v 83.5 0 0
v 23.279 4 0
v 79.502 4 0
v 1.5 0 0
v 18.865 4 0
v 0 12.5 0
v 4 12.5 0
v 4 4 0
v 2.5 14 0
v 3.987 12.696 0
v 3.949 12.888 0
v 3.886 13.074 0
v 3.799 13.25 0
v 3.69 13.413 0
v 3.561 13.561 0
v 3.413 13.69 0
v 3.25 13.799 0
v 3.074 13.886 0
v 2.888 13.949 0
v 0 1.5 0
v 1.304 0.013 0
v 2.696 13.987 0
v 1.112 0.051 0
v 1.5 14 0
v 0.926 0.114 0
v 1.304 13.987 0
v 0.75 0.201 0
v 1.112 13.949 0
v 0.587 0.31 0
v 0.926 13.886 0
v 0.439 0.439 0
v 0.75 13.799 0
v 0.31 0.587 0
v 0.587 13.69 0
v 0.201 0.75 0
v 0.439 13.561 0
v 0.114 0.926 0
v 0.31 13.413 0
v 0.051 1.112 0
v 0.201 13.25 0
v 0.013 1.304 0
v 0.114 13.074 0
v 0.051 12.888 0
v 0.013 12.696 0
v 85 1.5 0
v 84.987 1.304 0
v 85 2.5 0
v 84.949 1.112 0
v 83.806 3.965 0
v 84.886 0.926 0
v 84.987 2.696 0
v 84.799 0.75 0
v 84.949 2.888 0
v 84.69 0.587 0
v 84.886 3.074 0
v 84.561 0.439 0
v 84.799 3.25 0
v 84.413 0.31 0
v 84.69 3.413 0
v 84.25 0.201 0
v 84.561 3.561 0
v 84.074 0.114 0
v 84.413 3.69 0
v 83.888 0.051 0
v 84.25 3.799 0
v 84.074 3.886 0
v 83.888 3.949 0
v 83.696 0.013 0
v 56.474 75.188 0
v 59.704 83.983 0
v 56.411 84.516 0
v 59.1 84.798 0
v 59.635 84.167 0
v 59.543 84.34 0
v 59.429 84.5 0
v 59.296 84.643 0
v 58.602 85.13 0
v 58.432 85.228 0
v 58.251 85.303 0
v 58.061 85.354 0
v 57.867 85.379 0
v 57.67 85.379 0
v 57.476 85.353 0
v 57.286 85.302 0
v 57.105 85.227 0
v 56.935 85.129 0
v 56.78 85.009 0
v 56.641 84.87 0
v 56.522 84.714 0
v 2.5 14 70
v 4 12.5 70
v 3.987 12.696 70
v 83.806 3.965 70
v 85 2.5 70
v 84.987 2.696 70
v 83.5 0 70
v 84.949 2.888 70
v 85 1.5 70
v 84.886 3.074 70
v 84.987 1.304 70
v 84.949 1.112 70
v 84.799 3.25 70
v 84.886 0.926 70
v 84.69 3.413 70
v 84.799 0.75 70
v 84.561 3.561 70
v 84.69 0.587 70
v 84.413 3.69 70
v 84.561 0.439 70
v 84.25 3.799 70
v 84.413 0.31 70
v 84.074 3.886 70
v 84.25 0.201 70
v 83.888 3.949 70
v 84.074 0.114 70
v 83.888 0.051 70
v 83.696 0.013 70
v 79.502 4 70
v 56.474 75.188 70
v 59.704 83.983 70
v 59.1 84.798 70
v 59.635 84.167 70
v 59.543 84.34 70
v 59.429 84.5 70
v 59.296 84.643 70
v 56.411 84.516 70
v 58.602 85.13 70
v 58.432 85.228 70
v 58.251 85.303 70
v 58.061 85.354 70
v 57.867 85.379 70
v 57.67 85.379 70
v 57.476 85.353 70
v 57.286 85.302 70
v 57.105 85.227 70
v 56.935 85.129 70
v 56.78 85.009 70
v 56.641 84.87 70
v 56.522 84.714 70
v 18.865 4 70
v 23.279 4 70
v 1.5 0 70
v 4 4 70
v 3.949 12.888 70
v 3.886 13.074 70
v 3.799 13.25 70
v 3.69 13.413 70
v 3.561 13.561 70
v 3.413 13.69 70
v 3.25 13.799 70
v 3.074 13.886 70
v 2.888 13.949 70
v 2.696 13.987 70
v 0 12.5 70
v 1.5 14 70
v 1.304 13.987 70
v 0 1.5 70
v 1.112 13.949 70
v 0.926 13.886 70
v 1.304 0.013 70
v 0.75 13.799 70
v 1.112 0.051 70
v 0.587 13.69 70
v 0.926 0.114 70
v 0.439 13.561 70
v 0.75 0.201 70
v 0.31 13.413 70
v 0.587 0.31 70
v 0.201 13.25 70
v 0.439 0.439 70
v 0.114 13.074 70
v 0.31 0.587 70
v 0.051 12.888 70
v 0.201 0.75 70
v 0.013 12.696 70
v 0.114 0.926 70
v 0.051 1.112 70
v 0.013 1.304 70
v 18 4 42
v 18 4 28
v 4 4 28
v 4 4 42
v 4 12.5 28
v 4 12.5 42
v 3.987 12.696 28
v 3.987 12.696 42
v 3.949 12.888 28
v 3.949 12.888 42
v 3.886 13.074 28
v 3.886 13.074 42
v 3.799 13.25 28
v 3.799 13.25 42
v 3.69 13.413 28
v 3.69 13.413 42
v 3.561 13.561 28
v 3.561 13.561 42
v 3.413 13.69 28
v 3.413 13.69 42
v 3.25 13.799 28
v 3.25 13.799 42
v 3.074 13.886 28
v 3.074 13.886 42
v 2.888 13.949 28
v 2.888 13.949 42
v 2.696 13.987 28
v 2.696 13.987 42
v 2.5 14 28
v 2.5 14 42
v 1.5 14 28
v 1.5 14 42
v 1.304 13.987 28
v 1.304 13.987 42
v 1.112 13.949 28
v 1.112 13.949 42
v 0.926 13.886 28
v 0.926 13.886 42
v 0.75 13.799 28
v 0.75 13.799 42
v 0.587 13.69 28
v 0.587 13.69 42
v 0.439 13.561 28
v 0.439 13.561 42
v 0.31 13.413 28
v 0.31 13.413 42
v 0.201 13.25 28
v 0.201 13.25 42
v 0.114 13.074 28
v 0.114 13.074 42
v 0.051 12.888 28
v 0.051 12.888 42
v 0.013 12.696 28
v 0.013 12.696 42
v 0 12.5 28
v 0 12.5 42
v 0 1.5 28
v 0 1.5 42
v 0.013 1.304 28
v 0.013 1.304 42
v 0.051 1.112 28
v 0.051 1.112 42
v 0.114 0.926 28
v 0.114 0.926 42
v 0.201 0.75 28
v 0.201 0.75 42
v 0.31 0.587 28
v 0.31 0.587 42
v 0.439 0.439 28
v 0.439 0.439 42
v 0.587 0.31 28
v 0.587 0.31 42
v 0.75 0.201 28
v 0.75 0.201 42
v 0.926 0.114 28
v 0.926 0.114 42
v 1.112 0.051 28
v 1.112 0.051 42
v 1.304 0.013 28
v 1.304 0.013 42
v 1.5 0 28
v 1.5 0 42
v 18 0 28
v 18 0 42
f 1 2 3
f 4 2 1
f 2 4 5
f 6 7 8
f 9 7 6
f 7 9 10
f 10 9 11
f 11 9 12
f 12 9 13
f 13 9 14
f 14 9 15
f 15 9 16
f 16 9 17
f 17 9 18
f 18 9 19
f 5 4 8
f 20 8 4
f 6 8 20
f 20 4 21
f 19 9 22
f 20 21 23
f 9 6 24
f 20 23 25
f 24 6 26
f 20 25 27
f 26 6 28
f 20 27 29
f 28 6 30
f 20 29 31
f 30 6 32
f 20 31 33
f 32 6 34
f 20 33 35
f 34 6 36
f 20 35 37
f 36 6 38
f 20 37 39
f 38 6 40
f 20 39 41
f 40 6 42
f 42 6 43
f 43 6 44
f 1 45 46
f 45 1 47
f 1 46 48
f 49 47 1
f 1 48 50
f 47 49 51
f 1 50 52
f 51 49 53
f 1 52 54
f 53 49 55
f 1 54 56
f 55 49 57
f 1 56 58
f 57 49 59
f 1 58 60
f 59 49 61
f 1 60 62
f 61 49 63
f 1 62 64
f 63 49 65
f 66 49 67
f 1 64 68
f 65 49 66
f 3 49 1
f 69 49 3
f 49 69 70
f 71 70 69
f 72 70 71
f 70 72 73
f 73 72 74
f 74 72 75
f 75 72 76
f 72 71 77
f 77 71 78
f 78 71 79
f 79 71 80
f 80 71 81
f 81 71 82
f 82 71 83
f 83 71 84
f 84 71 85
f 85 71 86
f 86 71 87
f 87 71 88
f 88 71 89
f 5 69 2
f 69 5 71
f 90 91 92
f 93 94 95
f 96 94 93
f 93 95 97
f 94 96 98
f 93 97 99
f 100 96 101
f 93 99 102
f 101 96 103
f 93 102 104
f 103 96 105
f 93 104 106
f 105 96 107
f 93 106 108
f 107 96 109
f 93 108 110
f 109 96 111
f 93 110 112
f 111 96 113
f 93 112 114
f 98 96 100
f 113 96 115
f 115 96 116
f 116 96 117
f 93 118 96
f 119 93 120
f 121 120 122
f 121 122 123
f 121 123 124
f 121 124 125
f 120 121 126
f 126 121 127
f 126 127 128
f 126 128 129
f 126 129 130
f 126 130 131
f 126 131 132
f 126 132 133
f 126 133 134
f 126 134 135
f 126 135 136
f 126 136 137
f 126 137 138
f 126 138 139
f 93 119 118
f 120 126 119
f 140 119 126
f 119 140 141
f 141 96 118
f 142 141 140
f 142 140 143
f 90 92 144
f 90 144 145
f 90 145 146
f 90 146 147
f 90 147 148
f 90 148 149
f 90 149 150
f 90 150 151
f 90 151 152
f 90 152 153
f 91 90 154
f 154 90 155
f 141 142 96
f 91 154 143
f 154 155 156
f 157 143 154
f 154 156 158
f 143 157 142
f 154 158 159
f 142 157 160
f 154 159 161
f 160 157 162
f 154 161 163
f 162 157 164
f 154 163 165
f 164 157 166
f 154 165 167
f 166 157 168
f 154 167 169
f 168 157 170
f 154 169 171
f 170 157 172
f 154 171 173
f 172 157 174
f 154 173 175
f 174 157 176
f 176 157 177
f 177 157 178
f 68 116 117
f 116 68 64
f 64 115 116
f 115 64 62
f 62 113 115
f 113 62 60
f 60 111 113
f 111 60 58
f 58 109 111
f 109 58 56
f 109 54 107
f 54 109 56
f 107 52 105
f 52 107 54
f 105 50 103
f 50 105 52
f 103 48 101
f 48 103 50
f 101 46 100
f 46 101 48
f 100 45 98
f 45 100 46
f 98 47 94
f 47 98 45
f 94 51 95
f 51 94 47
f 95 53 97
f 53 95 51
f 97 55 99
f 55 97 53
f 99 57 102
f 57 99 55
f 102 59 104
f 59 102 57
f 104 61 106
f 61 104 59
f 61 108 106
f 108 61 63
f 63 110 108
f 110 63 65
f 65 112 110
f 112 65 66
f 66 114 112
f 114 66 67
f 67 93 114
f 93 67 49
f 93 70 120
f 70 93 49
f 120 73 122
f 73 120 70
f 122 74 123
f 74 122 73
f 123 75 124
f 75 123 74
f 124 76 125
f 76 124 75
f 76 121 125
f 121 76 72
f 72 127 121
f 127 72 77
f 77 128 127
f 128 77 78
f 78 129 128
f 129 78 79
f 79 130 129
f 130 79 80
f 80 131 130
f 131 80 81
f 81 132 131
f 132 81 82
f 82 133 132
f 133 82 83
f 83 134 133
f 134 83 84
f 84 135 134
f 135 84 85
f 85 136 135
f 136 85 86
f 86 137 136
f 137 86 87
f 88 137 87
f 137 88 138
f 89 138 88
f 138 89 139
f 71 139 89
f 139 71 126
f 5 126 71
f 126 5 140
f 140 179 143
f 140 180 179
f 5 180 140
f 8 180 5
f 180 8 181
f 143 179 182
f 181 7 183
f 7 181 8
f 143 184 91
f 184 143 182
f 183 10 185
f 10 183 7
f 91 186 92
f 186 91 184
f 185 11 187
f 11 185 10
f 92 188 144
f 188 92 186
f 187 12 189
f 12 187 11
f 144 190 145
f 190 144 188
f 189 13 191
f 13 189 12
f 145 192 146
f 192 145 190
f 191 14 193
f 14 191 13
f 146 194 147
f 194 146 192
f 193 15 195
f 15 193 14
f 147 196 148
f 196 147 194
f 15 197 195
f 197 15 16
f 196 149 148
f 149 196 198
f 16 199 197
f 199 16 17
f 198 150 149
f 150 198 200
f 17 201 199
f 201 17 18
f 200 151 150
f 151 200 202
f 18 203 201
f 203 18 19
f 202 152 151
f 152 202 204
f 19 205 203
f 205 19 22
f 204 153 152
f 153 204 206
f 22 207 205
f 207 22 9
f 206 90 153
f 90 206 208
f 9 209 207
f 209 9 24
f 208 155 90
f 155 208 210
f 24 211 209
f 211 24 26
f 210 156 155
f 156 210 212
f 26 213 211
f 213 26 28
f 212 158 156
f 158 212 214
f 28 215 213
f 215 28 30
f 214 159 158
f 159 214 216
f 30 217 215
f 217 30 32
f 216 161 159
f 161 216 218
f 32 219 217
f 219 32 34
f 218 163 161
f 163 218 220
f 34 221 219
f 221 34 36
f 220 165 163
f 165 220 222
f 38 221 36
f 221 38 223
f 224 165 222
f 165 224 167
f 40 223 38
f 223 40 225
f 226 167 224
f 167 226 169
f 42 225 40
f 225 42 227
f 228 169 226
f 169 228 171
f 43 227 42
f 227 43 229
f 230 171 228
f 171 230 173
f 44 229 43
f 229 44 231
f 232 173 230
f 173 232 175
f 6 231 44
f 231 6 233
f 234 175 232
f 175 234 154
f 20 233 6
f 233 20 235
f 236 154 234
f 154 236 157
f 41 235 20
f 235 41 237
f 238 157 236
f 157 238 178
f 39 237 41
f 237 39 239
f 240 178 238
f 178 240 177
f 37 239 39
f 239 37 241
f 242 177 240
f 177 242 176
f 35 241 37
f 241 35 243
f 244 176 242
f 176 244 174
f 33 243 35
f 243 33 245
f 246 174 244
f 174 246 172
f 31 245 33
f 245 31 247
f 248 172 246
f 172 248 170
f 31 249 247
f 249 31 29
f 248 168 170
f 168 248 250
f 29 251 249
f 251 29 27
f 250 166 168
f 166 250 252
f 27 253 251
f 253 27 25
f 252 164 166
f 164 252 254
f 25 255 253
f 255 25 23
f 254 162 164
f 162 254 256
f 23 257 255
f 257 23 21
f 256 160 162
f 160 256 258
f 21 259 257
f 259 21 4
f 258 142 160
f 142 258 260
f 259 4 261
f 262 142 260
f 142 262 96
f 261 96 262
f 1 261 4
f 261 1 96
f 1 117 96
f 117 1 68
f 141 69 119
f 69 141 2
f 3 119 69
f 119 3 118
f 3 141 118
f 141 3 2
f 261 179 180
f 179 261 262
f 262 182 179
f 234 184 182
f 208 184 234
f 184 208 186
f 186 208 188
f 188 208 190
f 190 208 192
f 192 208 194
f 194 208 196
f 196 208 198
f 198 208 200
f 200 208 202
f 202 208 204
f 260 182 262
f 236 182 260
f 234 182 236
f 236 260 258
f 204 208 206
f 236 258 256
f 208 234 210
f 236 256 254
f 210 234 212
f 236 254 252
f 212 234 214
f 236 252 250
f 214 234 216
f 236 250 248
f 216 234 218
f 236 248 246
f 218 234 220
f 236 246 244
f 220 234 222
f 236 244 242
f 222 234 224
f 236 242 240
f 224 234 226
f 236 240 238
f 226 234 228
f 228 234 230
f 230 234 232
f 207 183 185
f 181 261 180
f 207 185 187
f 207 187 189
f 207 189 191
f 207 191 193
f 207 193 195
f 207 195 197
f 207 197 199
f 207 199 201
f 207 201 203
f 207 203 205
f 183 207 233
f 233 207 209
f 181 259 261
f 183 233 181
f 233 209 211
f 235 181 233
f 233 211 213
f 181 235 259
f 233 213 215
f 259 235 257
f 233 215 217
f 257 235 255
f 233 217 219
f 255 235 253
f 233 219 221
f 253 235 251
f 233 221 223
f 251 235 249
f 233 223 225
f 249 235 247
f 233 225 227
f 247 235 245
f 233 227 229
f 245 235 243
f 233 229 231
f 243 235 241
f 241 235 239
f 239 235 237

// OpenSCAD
// Parametric Phone Stand - prints on its side, no supports needed
// Change the values below to customize.

width        = 70;   // stand width (mm)
thick        = 4;    // wall thickness (mm)
angle        = 65;   // backrest angle from horizontal (deg)
back_len     = 95;   // backrest length (mm)
pocket       = 13;   // gap for phone + case (mm)
lip_h        = 14;   // front lip height (mm)
base_len     = 85;   // base depth (mm)
cable_w      = 14;   // charging-cable slot width (0 = none)
round_r      = 1.5;  // edge rounding (mm)

$fn = 48;

bx = thick + pocket;                     // backrest foot x
tx = bx + back_len * cos(angle);         // backrest top x
ty = back_len * sin(angle);              // backrest top y

module rounded() { offset(r=round_r) offset(delta=-round_r) children(); }

module frame() {
    // outer triangle minus inner triangle = rigid truss
    difference() {
        polygon([[bx,0],[tx,ty],[tx+thick*0.6,ty-thick*0.4],[base_len,0]]);
        offset(delta=-thick) polygon([[bx,0],[tx,ty],[base_len,0]]);
    }
}

module profile() {
    rounded() union() {
        square([base_len, thick]);           // base
        square([thick, lip_h]);              // front lip
        frame();                             // backrest + strut
    }
}

module stand() {
    difference() {
        linear_extrude(width) profile();
        // cable slot through lip and base front
        if (cable_w > 0)
            translate([-1, -1, width/2 - cable_w/2])
                cube([bx + 2, lip_h + 2, cable_w]);
    }
}

stand();
